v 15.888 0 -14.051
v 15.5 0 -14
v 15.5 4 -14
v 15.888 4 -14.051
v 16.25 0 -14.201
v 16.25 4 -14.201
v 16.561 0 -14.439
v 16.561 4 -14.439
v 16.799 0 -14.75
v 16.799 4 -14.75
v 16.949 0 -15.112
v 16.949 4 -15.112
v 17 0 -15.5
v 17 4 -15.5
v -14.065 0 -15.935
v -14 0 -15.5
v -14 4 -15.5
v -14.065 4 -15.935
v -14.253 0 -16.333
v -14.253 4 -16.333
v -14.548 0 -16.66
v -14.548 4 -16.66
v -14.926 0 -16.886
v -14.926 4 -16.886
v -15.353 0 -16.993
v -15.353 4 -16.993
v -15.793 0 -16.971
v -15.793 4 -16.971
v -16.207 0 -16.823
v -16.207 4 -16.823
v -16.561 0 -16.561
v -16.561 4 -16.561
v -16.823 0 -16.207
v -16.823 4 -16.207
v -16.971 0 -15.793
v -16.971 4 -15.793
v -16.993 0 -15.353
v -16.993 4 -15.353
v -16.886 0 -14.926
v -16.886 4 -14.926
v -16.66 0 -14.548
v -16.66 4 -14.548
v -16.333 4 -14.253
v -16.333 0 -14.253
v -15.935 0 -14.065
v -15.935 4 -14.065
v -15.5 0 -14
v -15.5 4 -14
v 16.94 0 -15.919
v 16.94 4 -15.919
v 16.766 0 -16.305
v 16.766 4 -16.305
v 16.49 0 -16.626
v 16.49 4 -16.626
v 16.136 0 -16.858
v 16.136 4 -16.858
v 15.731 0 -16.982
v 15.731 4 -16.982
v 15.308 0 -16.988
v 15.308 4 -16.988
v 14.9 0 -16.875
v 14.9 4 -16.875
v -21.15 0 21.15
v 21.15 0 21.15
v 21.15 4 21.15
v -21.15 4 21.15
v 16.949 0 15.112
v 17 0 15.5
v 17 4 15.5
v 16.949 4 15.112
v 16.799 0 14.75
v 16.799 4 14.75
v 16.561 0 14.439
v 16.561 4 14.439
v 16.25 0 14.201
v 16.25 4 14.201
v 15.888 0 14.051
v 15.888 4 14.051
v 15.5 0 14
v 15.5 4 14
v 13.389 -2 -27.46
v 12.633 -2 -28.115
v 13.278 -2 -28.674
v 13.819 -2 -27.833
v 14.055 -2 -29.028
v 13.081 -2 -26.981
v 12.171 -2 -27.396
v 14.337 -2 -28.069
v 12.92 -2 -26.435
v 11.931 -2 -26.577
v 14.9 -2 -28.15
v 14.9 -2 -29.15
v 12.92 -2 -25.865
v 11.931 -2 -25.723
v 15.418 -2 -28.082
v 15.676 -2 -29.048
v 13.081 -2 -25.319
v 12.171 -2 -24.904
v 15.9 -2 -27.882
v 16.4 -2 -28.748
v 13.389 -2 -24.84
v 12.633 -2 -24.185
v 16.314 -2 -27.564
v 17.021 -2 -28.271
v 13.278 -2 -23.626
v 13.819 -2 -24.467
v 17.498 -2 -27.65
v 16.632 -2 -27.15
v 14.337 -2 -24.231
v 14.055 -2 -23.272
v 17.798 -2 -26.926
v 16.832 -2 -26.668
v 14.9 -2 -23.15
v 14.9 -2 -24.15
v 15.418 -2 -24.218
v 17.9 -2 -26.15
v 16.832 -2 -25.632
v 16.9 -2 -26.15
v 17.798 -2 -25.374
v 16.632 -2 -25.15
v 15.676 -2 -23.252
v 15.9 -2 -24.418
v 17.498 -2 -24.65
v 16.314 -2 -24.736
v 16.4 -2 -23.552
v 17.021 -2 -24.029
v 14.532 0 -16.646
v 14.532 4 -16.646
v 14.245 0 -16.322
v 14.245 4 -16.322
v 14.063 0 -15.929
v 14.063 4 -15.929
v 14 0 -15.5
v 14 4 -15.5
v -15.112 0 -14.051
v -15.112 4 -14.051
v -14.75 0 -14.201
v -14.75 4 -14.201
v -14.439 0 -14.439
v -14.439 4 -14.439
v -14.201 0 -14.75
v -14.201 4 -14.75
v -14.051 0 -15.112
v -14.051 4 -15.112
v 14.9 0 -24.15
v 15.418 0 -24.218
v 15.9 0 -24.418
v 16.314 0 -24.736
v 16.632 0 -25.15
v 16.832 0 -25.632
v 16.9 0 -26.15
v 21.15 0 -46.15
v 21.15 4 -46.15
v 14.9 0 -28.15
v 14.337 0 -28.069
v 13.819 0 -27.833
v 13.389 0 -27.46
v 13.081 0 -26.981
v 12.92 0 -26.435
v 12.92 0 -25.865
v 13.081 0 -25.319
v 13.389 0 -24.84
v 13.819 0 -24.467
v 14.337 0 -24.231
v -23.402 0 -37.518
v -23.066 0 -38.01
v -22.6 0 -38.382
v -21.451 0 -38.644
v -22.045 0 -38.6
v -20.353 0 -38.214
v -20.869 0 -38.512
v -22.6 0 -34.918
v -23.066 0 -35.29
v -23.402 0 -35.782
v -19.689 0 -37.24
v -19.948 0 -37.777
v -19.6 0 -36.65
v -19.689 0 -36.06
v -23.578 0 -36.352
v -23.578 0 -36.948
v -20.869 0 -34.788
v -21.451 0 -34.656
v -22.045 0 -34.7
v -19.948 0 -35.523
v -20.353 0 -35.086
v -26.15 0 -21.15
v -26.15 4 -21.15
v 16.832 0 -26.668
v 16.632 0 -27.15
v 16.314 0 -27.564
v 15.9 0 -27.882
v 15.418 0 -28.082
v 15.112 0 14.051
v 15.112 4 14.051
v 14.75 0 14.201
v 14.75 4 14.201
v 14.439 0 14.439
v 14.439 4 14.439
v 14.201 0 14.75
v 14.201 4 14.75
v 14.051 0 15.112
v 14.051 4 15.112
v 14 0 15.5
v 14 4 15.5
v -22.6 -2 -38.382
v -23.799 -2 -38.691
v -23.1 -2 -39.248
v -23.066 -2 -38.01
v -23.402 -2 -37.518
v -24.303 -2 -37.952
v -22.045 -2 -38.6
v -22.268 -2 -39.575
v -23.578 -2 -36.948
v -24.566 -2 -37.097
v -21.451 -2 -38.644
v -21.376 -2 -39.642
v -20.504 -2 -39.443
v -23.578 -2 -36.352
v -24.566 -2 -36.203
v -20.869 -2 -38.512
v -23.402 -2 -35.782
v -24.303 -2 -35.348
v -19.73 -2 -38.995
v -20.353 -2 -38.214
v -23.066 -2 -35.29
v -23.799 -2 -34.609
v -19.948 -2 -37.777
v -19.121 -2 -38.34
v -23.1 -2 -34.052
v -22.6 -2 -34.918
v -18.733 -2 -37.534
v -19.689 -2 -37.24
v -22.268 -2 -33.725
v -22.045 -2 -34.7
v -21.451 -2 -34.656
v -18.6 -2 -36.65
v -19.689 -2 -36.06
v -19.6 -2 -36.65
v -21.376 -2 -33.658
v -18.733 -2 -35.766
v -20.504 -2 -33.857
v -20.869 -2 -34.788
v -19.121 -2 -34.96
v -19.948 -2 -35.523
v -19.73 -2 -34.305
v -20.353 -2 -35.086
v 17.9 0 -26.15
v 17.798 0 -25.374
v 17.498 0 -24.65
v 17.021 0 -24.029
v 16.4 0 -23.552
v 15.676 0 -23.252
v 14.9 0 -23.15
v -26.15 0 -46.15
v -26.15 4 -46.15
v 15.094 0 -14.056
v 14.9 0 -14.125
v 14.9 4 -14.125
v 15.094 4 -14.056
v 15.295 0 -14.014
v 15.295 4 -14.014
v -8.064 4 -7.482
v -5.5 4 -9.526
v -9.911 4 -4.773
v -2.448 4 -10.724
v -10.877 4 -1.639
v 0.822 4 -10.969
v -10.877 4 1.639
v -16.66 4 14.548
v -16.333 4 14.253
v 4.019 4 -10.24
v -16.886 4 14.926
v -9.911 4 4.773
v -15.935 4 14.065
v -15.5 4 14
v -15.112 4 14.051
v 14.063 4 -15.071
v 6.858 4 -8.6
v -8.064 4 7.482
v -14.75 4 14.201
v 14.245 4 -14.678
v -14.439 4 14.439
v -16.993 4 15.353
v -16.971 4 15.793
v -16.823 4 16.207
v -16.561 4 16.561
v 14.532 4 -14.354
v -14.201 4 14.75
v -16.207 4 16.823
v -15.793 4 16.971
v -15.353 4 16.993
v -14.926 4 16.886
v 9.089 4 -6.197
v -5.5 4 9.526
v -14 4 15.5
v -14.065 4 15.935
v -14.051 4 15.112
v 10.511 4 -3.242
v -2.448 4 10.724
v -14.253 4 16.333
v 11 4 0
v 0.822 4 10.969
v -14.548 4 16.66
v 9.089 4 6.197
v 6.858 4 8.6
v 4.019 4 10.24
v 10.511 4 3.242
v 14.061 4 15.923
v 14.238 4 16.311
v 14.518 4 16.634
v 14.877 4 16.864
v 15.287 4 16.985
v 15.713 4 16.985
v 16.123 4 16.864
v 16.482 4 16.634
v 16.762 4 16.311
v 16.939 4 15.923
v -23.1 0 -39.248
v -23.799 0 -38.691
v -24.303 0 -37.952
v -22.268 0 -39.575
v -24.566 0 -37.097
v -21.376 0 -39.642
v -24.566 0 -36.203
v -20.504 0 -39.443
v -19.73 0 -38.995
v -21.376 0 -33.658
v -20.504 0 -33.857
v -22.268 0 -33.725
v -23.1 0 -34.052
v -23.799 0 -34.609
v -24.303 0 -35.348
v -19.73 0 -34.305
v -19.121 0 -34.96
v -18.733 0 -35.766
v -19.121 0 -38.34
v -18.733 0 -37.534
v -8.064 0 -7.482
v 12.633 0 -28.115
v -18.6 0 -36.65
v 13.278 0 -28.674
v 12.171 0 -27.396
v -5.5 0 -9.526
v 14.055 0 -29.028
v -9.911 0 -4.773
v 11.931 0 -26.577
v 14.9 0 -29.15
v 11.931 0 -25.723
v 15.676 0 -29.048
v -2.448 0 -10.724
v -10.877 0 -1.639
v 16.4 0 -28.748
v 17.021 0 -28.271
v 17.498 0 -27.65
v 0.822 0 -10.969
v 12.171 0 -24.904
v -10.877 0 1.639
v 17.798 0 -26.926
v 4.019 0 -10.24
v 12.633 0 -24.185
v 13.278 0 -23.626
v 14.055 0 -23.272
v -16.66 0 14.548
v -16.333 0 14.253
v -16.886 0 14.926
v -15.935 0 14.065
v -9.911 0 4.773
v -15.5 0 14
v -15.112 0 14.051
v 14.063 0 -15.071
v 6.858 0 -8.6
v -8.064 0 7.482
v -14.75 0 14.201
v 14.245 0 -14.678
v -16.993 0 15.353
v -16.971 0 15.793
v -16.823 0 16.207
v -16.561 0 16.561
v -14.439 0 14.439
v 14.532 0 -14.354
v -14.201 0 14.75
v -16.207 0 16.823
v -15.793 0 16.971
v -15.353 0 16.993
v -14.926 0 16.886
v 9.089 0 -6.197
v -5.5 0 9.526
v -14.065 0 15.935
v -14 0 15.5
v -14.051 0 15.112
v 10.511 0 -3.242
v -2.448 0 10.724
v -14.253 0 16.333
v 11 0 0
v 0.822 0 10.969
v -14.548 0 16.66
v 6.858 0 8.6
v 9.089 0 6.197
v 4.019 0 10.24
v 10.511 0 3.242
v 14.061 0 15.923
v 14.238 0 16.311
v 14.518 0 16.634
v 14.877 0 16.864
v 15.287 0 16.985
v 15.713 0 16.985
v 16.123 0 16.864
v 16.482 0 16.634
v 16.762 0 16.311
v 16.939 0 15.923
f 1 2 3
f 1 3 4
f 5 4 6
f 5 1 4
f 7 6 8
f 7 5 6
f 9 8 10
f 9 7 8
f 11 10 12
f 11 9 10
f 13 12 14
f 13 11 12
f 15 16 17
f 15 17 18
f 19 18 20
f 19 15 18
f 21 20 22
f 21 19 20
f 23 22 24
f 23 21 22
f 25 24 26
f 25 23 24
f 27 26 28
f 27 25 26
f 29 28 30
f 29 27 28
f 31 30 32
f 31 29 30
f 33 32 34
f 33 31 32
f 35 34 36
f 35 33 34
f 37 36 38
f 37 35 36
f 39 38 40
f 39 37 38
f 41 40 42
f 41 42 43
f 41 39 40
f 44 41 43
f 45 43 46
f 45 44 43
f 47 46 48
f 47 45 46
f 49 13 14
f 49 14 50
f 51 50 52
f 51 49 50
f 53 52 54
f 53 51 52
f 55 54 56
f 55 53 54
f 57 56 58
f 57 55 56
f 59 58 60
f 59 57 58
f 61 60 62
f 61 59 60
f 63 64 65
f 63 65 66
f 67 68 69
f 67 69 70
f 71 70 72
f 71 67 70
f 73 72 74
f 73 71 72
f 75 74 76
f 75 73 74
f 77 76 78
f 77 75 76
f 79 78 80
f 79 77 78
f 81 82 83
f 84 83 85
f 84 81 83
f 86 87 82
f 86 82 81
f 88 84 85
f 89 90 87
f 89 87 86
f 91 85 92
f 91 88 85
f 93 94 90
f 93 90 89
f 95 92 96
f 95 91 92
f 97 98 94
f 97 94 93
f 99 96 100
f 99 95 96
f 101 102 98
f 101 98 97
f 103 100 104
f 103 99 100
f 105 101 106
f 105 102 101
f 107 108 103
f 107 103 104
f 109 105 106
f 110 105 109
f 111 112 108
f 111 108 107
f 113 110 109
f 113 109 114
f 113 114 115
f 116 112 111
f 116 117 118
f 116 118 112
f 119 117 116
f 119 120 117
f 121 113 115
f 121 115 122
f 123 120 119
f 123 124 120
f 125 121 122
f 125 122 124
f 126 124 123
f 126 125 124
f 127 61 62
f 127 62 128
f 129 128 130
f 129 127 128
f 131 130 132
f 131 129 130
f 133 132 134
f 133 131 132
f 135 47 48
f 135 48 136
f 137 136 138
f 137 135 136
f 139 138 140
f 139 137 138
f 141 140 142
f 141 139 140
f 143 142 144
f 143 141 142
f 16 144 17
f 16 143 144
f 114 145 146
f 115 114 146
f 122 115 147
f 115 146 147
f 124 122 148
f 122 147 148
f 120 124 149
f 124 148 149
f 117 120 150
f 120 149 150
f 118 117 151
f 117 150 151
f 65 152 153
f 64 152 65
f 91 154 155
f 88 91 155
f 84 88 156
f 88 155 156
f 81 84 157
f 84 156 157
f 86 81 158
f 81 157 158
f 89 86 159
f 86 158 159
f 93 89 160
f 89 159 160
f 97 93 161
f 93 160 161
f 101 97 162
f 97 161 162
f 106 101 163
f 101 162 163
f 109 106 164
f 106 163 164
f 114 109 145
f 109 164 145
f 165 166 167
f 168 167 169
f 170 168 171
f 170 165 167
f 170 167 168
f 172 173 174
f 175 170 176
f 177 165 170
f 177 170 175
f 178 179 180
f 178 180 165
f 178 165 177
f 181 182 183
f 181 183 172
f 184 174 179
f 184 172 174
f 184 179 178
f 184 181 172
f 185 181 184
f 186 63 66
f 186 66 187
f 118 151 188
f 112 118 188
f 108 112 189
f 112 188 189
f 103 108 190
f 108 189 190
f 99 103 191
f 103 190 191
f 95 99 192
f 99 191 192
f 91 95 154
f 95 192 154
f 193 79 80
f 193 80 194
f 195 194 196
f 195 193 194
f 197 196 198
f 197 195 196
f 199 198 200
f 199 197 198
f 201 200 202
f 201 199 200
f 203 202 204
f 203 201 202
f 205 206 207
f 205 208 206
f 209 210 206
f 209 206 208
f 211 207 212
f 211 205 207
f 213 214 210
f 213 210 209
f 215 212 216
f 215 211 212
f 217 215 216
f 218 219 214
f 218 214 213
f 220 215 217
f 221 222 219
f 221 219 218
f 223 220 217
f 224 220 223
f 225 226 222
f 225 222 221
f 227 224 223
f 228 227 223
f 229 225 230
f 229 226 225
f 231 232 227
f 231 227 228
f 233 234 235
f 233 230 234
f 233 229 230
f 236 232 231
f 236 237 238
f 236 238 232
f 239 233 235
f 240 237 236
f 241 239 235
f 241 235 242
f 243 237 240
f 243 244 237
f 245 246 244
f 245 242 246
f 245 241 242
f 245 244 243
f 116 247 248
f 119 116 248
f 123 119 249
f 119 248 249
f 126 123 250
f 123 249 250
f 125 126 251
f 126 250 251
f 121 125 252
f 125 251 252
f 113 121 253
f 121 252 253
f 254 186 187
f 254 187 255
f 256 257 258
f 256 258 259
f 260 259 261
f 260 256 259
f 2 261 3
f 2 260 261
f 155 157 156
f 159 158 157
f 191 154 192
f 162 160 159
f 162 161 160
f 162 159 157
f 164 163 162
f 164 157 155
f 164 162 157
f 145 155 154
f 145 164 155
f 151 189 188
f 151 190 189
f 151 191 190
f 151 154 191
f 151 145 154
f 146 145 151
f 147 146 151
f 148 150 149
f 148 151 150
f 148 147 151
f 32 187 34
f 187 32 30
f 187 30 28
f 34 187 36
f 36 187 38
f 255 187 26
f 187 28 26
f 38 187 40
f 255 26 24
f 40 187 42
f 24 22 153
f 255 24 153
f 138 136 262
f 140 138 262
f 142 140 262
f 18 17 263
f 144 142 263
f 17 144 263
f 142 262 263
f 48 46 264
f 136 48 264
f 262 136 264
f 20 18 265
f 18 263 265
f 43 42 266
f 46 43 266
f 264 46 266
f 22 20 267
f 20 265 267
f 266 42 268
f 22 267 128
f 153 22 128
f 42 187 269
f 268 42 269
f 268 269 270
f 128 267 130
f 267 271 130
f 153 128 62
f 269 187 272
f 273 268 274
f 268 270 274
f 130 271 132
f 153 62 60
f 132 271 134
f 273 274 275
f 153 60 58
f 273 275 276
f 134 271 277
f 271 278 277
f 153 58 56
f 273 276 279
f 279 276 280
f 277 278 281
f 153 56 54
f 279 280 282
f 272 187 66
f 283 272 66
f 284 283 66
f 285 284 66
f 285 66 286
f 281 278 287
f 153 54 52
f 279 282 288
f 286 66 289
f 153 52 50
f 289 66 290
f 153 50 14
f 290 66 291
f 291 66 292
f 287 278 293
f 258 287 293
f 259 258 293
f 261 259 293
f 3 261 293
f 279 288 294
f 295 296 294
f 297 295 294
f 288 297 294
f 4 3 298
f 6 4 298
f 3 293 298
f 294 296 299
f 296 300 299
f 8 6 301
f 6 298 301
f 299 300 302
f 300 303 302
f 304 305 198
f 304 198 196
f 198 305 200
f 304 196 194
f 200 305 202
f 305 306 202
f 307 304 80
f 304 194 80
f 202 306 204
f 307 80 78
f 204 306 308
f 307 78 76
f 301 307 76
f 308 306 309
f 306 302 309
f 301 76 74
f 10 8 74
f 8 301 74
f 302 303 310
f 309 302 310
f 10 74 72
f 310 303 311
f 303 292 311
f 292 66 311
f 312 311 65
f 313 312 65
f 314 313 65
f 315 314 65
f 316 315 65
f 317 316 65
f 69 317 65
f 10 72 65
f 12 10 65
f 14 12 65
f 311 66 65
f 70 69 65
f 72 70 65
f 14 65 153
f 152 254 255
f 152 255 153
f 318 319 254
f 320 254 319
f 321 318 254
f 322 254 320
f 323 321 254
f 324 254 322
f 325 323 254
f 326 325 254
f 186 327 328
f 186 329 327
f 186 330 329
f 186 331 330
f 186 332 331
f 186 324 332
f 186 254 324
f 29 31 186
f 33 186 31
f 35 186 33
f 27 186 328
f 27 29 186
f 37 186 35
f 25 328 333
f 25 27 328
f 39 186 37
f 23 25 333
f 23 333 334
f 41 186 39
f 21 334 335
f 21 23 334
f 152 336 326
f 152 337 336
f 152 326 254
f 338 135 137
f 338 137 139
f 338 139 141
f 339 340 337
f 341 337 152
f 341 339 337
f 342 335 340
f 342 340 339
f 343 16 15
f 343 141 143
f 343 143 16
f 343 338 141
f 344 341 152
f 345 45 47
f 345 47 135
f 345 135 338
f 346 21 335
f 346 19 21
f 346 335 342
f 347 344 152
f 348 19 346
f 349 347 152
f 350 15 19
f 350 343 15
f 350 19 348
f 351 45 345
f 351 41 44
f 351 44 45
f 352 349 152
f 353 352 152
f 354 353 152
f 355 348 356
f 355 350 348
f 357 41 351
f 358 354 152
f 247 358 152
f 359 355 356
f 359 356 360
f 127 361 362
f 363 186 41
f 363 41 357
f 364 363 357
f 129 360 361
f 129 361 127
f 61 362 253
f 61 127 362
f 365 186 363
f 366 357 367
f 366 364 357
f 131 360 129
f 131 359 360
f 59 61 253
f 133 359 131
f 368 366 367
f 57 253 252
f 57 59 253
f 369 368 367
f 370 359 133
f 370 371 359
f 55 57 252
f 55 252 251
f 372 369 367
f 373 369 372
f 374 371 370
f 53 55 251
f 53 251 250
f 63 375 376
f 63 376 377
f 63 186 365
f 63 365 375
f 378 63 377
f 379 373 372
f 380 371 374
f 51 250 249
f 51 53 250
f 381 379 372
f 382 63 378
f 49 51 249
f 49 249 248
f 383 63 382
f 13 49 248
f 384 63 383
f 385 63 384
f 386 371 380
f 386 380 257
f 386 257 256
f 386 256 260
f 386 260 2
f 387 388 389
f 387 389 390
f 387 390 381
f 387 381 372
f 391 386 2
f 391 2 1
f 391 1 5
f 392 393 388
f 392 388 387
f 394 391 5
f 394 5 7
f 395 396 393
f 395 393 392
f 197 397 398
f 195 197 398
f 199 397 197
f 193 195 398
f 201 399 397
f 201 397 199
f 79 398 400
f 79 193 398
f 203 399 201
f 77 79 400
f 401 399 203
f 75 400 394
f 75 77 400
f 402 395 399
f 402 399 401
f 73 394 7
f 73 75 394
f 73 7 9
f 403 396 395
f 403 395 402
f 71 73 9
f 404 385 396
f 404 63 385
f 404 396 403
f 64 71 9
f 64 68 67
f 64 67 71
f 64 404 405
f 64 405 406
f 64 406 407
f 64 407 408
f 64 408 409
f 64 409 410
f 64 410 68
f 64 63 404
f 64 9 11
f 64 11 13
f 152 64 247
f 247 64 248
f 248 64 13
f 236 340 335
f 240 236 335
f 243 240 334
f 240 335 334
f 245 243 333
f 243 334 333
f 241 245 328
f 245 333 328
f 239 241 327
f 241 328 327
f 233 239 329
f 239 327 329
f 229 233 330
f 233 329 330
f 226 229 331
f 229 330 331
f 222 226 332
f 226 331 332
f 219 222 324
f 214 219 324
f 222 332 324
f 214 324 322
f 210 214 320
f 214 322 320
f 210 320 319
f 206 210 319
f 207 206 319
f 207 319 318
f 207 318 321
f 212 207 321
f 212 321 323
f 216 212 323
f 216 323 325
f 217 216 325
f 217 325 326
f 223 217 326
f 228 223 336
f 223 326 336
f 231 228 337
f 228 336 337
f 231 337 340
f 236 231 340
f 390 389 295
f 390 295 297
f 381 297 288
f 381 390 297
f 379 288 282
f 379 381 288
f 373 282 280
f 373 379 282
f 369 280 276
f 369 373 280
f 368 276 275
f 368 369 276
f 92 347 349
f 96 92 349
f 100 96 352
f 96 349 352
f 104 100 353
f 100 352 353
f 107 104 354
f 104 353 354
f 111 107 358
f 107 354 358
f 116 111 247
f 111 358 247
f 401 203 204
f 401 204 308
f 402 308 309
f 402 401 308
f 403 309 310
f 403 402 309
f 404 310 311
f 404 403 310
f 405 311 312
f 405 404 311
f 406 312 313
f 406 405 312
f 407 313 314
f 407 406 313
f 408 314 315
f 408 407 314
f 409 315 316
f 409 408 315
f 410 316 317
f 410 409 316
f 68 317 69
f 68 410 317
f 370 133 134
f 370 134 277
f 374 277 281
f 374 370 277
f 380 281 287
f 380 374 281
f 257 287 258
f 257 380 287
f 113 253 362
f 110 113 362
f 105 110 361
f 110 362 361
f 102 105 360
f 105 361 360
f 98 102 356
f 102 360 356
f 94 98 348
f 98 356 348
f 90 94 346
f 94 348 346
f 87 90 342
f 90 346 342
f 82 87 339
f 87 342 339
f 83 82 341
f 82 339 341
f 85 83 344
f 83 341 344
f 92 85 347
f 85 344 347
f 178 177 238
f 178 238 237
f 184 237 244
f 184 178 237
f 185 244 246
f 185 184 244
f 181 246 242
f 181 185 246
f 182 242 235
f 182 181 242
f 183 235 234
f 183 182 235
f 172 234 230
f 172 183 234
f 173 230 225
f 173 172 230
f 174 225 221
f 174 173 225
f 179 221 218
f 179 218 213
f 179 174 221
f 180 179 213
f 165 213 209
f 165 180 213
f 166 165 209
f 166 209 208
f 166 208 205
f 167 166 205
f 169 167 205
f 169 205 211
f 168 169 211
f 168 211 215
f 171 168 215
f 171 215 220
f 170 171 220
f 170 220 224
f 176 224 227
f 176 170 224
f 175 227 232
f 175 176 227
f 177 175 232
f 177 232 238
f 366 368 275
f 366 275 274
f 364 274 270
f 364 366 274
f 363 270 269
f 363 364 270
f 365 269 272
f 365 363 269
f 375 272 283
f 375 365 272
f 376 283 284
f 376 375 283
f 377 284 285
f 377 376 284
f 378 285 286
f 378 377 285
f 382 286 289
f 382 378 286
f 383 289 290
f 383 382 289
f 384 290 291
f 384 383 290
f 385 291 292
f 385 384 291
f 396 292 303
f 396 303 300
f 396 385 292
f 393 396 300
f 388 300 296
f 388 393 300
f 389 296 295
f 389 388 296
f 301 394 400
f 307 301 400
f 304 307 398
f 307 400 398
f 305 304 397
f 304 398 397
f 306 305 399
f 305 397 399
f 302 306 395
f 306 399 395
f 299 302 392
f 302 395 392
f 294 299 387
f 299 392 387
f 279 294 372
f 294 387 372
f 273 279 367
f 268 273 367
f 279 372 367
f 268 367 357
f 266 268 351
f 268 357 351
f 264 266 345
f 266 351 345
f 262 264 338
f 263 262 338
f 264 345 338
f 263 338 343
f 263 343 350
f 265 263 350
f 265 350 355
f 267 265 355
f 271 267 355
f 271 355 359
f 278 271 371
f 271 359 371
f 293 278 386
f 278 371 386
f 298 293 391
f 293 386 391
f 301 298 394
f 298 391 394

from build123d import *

# Parameters (mm, degrees)
F0_R     = 3
F0_R_2   = 11
F0_R_3   = 2
F1_DEPTH = 4
F2_DEPTH = 2


# Not quite as in the source:
# - a feature names something its author has since deleted; it is built from what else it names


with BuildPart() as f1:
    # F0 (on Front) → F1 (new body)
    with BuildSketch(Plane.XZ):
        Polygon((14.9, -21.15), (21.15, -21.15), (21.15, 21.15), (5.15, 21.15), (-21.15, 21.15), (-21.15, -21.15), align=None)
        with BuildLine():
            ThreePointArc((17, -15.5), (16.3215838363, -16.7549900398), (14.9, -16.8747727085))
            ThreePointArc((14.9, -16.8747727085), (14.2450099602, -16.3215838363), (14, -15.5))
            Line((14, -15.5), (-14, -15.5))
            ThreePointArc((-14, -15.5), (-16.5606601718, -16.5606601718), (-15.5, -14))
            Line((-15.5, -14), (-15.5, 14))
            ThreePointArc((-15.5, 14), (-16.5606601718, 16.5606601718), (-14, 15.5))
            Line((-14, 15.5), (14, 15.5))
            ThreePointArc((14, 15.5), (15.5, 17), (17, 15.5))
            ThreePointArc((17, 15.5), (16.5606601718, 14.4393398282), (15.5, 14))
            Line((15.5, 14), (15.5, -14))
            ThreePointArc((15.5, -14), (16.5606601718, -14.4393398282), (17, -15.5))
        make_face(mode=Mode.SUBTRACT)
        Polygon((21.15, -46.15), (21.15, -21.15), (14.9, -21.15), (-21.15, -21.15), (-26.15, -21.15), (-26.15, -41.15), (-26.15, -46.15), (-21.15, -46.15), align=None)
        with Locations((-21.6, -36.65)):
            Circle(F0_R, mode=Mode.SUBTRACT)
        with BuildLine():
            ThreePointArc((14.9, -29.15), (11.9, -26.15), (14.9, -23.15))
            ThreePointArc((14.9, -23.15), (17.0213203436, -24.0286796564), (17.9, -26.15))
            ThreePointArc((17.9, -26.15), (17.0213203436, -28.2713203436), (14.9, -29.15))
        make_face(mode=Mode.SUBTRACT)
        with BuildLine():
            Line((-14, -15.5), (14, -15.5))
            ThreePointArc((14, -15.5), (14.2450099602, -14.6784161637), (14.9, -14.1252272915))
            ThreePointArc((14.9, -14.1252272915), (15.1935355345, -14.0316405306), (15.5, -14))
            Line((15.5, -14), (15.5, 14))
            ThreePointArc((15.5, 14), (14.4393398282, 14.4393398282), (14, 15.5))
            Line((14, 15.5), (-14, 15.5))
            ThreePointArc((-14, 15.5), (-14.4393398282, 14.4393398282), (-15.5, 14))
            Line((-15.5, 14), (-15.5, -14))
            ThreePointArc((-15.5, -14), (-14.4393398282, -14.4393398282), (-14, -15.5))
        make_face()
        Circle(F0_R_2, mode=Mode.SUBTRACT)
        Polygon((-26.15, -21.15), (-21.15, -21.15), (-21.15, 21.15), align=None)
        with Locations((-21.6, -36.65)):
            Circle(F0_R)
        with Locations((-21.6, -36.65)):
            Circle(F0_R_3, mode=Mode.SUBTRACT)
        with Locations((-21.6, -36.65)):
            Circle(F0_R_3)
        with BuildLine():
            ThreePointArc((17.9, -26.15), (17.0213203436, -24.0286796564), (14.9, -23.15))
            Line((14.9, -23.15), (14.9, -24.15))
            ThreePointArc((14.9, -24.15), (16.3142135624, -24.7357864376), (16.9, -26.15))
            ThreePointArc((16.9, -26.15), (16.3142135624, -27.5642135624), (14.9, -28.15))
            Line((14.9, -28.15), (14.9, -29.15))
            ThreePointArc((14.9, -29.15), (17.0213203436, -28.2713203436), (17.9, -26.15))
        make_face()
        with BuildLine():
            Line((14.9, -24.15), (14.9, -23.15))
            ThreePointArc((14.9, -23.15), (11.9, -26.15), (14.9, -29.15))
            Line((14.9, -29.15), (14.9, -28.15))
            ThreePointArc((14.9, -28.15), (12.9, -26.15), (14.9, -24.15))
        make_face()
        with BuildLine():
            ThreePointArc((16.9, -26.15), (16.3142135624, -24.7357864376), (14.9, -24.15))
            Line((14.9, -24.15), (14.9, -26.15))
            Line((14.9, -26.15), (14.9, -28.15))
            ThreePointArc((14.9, -28.15), (16.3142135624, -27.5642135624), (16.9, -26.15))
        make_face()
        with BuildLine():
            Line((14.9, -26.15), (14.9, -24.15))
            ThreePointArc((14.9, -24.15), (12.9, -26.15), (14.9, -28.15))
            Line((14.9, -28.15), (14.9, -26.15))
        make_face()
    extrude(amount=-F1_DEPTH)

    # F0 (on Front) → F2 (join)
    with BuildSketch(Plane.XZ):
        with BuildLine():
            Line((14.9, -24.15), (14.9, -23.15))
            ThreePointArc((14.9, -23.15), (11.9, -26.15), (14.9, -29.15))
            Line((14.9, -29.15), (14.9, -28.15))
            ThreePointArc((14.9, -28.15), (12.9, -26.15), (14.9, -24.15))
        make_face()
        with BuildLine():
            ThreePointArc((17.9, -26.15), (17.0213203436, -24.0286796564), (14.9, -23.15))
            Line((14.9, -23.15), (14.9, -24.15))
            ThreePointArc((14.9, -24.15), (16.3142135624, -24.7357864376), (16.9, -26.15))
            ThreePointArc((16.9, -26.15), (16.3142135624, -27.5642135624), (14.9, -28.15))
            Line((14.9, -28.15), (14.9, -29.15))
            ThreePointArc((14.9, -29.15), (17.0213203436, -28.2713203436), (17.9, -26.15))
        make_face()
        with Locations((-21.6, -36.65)):
            Circle(F0_R)
        with Locations((-21.6, -36.65)):
            Circle(F0_R_3, mode=Mode.SUBTRACT)
    extrude(amount=F2_DEPTH)


solid = f1.part
